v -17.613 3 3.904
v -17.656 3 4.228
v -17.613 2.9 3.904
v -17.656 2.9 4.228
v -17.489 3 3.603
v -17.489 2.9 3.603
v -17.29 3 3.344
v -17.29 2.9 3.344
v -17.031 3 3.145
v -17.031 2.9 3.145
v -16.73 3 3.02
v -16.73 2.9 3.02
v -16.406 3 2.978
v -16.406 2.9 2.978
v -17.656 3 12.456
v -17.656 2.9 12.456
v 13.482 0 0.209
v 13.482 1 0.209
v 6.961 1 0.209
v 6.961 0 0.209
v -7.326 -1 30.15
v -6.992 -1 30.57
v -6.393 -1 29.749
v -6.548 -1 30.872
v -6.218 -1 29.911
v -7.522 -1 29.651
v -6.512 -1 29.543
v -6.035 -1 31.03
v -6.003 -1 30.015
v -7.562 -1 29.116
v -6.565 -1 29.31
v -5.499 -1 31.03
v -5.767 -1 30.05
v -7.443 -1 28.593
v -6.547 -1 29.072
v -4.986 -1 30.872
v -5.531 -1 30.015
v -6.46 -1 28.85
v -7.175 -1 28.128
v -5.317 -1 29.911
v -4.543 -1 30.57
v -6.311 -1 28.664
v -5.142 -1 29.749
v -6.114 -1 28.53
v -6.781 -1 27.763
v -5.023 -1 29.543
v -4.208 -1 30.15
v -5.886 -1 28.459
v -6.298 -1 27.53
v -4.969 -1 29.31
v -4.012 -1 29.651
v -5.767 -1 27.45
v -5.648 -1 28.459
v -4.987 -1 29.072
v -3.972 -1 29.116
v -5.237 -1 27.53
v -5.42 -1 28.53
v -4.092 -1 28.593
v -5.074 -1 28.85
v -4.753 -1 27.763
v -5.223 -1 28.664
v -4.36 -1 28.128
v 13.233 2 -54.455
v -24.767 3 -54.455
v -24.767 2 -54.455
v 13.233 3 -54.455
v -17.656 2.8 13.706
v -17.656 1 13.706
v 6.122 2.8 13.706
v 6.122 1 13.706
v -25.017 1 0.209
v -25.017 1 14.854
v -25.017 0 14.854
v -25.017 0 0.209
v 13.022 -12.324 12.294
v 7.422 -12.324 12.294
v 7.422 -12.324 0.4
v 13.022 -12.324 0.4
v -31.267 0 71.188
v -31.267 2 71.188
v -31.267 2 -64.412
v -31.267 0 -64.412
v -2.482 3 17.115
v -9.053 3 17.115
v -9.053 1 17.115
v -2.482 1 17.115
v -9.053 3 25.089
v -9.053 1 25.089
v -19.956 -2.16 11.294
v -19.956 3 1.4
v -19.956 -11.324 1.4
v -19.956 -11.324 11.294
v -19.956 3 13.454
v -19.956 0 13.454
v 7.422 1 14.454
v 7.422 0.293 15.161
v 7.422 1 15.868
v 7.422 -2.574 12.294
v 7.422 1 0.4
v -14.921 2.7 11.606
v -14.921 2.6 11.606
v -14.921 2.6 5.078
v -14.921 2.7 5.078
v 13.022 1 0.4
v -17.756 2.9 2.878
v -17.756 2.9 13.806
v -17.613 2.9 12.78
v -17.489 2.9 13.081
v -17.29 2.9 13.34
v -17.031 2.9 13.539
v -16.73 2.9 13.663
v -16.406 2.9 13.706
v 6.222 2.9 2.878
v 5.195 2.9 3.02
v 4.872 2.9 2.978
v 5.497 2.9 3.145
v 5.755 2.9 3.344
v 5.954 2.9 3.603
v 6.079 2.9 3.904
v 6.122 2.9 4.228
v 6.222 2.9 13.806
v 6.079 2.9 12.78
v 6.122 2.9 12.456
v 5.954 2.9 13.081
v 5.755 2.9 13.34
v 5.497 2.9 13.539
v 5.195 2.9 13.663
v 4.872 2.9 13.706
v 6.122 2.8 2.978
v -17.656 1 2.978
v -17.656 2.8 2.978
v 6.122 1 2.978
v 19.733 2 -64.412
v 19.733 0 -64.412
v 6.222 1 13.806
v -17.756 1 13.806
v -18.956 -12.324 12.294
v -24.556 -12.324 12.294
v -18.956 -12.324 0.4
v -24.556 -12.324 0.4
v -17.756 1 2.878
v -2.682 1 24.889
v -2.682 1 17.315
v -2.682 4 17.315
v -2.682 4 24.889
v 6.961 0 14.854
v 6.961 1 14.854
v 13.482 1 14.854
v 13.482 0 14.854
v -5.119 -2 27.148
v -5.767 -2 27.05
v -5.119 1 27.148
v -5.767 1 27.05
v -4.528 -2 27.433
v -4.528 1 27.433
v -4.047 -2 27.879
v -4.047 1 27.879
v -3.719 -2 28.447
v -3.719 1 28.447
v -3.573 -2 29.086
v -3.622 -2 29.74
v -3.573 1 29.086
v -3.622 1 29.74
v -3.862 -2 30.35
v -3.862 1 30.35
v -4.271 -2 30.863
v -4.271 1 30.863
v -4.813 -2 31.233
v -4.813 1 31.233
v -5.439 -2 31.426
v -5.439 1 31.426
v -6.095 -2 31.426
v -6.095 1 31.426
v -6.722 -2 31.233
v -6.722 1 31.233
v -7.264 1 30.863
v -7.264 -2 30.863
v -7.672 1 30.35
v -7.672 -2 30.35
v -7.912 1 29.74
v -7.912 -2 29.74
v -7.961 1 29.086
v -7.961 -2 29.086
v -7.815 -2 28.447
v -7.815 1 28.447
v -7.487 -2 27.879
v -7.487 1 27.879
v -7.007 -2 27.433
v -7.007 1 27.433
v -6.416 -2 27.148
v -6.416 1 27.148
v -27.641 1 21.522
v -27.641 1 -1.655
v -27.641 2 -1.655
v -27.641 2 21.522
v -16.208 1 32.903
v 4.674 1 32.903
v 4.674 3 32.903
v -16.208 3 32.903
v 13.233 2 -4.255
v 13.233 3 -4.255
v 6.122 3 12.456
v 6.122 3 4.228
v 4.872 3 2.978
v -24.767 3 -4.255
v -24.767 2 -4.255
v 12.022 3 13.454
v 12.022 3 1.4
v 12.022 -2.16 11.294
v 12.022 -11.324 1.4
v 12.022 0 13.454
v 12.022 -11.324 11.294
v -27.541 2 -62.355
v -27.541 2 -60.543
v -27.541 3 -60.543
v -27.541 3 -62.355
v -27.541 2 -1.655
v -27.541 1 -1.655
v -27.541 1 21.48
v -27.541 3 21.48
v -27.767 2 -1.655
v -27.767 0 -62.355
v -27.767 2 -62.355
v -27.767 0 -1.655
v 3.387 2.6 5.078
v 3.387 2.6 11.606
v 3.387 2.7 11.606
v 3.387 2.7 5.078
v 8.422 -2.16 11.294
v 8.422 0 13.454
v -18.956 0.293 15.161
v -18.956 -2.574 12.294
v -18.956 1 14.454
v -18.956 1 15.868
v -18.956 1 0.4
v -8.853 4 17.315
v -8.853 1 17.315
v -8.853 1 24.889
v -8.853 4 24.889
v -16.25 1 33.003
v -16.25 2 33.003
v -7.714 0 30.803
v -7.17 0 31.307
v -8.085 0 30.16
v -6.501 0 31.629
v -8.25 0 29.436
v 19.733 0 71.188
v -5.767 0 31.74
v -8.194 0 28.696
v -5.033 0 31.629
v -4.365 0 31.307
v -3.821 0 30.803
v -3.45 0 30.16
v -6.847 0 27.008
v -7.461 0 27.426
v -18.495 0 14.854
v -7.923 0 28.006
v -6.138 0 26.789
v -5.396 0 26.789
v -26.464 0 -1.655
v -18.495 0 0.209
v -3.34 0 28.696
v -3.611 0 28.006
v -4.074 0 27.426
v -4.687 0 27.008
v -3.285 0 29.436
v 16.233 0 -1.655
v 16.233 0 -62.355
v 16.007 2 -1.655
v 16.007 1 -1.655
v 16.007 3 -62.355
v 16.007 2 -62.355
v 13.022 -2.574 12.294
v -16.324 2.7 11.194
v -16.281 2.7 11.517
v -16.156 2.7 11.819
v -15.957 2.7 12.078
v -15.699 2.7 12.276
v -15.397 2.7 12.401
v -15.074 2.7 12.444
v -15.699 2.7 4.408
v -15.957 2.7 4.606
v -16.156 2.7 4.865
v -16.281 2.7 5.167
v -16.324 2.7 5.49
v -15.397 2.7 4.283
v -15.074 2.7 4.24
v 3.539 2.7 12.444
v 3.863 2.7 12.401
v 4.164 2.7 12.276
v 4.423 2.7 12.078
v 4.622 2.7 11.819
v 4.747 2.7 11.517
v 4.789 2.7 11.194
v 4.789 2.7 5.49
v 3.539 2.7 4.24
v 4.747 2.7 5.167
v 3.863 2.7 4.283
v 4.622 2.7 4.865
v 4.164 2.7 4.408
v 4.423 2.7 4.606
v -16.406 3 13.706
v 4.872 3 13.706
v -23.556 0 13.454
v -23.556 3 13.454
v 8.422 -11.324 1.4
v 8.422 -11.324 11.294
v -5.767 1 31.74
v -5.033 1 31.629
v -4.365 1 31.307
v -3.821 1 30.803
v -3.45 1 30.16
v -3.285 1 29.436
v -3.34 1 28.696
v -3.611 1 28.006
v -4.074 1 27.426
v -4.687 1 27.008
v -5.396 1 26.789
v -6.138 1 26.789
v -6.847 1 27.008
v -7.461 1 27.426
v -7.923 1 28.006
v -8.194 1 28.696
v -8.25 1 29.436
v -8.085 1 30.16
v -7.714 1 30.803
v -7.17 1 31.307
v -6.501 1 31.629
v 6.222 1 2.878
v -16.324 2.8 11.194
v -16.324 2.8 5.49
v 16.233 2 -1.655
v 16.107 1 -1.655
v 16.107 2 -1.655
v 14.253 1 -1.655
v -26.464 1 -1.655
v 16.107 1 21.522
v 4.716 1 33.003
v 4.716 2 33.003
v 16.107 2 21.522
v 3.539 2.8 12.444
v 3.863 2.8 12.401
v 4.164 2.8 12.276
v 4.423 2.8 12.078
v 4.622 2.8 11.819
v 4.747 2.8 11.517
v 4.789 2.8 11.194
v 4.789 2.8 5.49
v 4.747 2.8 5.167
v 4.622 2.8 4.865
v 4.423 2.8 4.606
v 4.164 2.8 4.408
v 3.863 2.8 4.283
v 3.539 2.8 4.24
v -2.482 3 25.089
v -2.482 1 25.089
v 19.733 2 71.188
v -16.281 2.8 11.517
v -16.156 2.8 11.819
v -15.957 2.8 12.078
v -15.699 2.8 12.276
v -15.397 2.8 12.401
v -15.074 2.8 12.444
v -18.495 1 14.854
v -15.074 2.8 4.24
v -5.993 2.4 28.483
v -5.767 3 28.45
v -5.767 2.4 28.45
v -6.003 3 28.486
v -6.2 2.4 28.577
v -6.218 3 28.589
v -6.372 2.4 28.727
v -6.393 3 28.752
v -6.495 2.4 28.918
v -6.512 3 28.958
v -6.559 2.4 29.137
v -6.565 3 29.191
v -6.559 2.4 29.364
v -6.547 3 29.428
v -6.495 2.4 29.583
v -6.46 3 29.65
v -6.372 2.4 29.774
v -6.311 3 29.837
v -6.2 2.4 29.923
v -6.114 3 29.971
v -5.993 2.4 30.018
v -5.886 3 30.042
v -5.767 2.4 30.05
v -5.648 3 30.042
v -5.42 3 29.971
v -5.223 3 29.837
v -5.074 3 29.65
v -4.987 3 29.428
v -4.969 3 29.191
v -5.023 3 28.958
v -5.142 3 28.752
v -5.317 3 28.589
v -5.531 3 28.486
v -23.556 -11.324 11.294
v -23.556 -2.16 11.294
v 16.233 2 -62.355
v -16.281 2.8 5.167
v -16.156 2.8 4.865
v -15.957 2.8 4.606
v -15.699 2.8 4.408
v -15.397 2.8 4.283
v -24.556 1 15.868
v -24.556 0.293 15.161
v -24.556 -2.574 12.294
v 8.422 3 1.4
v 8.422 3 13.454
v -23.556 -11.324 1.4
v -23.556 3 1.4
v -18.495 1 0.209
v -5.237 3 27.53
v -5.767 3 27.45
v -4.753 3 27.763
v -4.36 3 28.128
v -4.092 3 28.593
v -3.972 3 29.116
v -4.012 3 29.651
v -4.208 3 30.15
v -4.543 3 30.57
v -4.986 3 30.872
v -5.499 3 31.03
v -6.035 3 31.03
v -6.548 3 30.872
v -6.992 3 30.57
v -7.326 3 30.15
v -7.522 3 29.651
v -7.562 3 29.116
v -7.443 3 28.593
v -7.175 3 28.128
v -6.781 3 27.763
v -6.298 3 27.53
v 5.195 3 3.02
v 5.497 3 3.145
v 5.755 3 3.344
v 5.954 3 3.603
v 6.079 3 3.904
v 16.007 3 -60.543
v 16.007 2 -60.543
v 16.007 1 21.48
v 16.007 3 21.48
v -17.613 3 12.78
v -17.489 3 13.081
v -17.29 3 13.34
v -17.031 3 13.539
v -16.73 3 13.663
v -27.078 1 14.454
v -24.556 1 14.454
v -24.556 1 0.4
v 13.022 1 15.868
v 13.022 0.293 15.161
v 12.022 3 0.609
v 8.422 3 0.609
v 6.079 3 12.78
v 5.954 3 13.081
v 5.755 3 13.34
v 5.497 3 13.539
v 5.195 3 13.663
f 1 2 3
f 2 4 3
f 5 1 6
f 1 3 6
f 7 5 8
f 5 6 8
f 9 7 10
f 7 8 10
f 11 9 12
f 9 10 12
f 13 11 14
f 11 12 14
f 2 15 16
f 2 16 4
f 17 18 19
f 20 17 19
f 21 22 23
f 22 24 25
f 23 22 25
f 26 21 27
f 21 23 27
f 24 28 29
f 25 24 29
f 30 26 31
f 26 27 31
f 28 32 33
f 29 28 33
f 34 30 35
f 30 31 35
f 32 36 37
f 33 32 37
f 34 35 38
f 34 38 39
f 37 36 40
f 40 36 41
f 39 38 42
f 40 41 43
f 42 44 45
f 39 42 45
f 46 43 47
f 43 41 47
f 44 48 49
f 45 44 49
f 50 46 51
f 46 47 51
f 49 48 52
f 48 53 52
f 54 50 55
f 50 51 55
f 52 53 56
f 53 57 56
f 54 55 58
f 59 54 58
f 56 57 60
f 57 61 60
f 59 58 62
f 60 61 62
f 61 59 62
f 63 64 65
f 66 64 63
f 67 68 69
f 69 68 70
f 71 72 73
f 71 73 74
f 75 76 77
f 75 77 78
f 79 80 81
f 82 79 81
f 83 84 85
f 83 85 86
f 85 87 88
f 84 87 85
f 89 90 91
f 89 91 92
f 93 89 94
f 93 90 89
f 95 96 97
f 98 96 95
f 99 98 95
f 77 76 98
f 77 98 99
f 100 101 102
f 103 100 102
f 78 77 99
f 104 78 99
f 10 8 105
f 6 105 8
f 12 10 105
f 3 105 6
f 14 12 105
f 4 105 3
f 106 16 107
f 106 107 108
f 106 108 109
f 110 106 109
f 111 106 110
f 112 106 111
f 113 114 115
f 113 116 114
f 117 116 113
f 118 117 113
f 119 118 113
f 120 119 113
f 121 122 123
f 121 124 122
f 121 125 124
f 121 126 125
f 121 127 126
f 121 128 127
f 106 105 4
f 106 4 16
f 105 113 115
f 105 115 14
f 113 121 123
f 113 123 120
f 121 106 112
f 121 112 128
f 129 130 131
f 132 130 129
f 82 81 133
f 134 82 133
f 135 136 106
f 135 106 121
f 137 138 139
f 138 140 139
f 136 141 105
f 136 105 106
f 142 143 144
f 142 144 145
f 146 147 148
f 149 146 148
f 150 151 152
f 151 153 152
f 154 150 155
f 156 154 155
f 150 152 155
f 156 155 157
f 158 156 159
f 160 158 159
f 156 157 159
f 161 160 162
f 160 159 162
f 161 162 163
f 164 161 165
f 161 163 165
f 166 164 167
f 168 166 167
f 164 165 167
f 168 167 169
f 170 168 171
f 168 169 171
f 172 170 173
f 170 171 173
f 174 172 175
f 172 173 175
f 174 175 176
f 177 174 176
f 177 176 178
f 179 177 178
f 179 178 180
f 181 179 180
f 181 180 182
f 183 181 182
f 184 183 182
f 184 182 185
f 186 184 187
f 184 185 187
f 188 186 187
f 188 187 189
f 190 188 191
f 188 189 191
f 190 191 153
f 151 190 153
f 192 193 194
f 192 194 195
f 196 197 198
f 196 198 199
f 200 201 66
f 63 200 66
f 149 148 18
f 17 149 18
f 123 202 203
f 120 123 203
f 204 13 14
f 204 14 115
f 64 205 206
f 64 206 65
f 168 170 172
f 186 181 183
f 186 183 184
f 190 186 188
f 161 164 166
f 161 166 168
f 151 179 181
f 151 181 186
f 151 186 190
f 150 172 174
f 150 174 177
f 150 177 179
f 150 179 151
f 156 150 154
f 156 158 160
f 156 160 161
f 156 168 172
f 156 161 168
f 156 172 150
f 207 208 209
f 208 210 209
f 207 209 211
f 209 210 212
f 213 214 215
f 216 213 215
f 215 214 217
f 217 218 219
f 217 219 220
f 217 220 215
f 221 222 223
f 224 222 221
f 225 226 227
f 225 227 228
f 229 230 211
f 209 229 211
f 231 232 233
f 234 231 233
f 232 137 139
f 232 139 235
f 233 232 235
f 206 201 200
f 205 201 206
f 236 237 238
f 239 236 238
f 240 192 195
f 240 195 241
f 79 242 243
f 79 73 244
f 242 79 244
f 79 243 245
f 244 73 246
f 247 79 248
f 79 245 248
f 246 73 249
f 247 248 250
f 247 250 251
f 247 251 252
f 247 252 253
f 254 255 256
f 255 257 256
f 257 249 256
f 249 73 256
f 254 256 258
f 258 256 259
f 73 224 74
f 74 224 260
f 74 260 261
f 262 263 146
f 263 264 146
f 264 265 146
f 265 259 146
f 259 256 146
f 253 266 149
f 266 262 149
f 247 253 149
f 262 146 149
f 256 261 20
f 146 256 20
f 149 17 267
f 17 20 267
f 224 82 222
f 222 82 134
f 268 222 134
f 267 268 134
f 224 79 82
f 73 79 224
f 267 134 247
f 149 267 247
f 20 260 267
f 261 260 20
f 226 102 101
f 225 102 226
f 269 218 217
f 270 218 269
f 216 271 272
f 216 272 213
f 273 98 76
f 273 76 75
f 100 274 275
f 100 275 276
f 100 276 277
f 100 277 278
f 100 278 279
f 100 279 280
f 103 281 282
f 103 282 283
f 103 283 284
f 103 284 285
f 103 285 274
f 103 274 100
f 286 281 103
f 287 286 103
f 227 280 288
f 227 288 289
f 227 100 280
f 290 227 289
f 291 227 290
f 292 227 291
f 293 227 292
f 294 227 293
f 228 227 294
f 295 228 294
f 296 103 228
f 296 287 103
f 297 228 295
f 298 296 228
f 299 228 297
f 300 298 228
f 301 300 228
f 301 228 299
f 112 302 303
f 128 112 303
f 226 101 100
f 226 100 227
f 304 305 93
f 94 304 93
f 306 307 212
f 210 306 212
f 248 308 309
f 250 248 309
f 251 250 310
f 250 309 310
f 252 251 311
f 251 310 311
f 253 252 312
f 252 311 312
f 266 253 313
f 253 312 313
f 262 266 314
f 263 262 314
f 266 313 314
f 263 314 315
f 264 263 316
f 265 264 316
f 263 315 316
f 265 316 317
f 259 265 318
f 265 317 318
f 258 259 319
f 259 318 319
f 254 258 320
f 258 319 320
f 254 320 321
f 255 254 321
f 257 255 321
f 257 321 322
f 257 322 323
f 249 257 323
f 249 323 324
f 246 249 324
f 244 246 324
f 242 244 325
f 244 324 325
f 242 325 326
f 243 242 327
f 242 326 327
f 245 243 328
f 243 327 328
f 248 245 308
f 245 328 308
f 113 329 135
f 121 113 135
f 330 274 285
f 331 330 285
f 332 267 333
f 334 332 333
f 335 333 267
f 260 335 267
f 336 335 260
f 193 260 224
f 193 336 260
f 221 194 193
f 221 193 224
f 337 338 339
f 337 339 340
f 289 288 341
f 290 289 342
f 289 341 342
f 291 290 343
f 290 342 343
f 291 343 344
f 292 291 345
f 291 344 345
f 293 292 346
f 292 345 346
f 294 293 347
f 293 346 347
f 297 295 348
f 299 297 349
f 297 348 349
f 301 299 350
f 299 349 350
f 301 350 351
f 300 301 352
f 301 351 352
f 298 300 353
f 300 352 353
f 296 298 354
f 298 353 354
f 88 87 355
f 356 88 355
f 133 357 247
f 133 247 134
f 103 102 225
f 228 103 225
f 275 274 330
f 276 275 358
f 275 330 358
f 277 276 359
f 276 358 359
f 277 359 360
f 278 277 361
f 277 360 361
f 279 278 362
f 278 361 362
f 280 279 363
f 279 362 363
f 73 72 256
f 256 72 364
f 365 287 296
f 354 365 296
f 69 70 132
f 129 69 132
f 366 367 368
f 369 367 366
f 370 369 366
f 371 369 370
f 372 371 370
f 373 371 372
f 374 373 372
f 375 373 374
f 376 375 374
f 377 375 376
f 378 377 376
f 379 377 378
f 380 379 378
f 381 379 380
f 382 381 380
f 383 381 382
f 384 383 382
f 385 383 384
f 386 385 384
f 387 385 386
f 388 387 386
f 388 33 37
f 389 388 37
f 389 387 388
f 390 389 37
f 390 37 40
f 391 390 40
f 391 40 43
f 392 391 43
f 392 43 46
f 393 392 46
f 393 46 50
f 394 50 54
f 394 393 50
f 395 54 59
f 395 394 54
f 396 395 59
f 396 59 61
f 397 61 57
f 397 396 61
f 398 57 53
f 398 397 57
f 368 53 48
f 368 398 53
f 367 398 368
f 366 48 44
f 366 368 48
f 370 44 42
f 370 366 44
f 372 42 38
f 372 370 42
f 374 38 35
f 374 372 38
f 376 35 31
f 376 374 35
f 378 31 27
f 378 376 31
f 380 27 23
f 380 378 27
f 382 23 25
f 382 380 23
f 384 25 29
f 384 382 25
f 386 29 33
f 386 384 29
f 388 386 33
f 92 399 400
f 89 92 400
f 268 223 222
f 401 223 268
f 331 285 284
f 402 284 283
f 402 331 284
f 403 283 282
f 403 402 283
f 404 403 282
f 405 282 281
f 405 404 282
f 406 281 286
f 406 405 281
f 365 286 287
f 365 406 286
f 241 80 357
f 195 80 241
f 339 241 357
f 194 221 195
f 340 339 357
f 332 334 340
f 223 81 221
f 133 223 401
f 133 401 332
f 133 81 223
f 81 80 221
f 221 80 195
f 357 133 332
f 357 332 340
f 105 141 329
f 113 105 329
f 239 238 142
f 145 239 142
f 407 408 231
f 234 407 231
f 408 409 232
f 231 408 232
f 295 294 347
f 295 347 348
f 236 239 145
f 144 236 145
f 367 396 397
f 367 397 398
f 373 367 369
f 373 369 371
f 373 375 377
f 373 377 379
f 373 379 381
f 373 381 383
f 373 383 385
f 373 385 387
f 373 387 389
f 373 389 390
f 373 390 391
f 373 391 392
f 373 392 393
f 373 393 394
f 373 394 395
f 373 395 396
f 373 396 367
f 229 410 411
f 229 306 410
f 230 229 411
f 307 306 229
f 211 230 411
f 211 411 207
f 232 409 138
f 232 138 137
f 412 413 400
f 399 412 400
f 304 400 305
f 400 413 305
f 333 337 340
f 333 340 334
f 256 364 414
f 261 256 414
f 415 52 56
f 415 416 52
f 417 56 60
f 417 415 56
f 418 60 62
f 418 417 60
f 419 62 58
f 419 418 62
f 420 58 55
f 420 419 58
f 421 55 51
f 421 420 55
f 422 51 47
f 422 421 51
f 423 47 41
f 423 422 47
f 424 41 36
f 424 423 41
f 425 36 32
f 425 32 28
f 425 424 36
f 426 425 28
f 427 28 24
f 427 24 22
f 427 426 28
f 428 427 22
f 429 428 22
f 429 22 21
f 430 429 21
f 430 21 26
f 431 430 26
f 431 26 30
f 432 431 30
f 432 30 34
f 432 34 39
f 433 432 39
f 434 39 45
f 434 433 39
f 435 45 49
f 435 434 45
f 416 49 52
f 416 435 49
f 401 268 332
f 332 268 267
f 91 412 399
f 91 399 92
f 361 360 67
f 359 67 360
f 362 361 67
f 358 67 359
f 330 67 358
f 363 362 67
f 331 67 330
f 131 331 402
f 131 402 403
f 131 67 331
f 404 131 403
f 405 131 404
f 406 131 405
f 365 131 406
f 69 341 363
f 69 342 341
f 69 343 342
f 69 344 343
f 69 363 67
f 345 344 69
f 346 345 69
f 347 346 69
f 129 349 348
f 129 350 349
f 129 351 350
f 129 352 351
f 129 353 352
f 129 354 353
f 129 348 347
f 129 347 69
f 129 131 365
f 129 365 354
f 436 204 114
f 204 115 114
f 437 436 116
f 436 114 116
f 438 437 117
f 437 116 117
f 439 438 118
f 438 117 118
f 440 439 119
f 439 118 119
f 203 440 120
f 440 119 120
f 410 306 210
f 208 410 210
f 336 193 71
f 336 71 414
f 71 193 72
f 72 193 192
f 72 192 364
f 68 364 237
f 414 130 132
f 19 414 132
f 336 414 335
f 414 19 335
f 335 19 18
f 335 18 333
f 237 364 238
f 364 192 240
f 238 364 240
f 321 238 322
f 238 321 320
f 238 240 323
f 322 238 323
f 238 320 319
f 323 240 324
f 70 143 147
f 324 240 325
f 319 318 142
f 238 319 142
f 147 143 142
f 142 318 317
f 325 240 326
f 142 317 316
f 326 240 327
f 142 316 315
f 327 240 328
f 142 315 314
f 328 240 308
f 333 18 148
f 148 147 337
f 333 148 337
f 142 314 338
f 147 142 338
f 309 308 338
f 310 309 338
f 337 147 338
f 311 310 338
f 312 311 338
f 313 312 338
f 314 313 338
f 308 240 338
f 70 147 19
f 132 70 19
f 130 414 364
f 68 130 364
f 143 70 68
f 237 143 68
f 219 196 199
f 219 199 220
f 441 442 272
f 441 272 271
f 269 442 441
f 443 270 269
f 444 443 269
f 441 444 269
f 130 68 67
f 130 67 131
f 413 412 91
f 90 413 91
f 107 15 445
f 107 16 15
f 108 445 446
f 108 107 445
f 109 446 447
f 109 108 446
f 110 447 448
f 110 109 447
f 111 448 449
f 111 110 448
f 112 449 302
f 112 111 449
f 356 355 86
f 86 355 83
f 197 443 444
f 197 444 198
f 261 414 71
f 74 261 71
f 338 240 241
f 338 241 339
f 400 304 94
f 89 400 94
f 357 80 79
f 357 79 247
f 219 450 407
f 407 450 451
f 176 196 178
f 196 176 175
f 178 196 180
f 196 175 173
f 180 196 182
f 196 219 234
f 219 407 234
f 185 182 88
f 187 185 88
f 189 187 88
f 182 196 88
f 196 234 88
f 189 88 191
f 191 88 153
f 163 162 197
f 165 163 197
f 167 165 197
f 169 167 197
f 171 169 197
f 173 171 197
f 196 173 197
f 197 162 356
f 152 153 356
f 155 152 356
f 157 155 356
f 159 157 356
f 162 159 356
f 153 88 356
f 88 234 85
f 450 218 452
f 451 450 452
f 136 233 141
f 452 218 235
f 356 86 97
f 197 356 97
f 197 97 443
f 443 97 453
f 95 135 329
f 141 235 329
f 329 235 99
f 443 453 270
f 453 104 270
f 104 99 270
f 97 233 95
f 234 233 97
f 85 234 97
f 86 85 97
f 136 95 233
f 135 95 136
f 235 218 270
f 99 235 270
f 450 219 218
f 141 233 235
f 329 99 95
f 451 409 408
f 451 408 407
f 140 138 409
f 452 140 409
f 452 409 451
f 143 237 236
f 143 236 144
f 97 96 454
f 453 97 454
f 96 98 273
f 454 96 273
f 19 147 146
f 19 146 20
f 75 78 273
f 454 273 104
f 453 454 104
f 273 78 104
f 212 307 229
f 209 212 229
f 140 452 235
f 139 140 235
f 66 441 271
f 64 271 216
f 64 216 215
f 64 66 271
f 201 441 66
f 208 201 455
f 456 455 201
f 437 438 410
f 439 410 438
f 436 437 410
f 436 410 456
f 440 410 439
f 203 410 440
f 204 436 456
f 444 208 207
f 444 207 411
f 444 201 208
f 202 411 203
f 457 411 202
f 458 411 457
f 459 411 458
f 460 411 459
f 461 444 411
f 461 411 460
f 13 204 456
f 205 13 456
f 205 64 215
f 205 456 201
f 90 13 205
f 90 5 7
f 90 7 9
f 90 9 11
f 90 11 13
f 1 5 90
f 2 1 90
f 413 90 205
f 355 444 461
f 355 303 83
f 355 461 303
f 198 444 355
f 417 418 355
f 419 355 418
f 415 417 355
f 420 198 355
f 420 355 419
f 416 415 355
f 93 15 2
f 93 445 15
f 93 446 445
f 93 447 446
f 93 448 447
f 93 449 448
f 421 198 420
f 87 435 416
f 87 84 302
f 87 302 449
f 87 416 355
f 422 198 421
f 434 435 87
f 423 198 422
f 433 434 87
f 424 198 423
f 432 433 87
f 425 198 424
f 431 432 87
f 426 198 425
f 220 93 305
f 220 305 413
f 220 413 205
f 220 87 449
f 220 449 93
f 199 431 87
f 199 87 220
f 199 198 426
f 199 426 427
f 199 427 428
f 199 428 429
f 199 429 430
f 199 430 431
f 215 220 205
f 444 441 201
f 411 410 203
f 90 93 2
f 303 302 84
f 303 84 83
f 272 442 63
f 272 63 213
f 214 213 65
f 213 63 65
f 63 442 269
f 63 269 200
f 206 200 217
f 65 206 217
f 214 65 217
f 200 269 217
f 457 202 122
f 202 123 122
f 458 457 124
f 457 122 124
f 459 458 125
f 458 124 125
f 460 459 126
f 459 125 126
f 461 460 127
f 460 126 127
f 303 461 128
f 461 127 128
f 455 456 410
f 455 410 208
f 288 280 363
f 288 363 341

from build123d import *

# Parameters (mm, degrees)
SKETCH1_W                   = 51.332398317
SKETCH1_H                   = 136.325385694
BOSS_EXTRUDE1_DEPTH         = 2
CUT_EXTRUDE1_DEPTH          = 1
SKETCH3_W                   = 26.718092566
SKETCH3_H                   = 51.160838605
CUT_EXTRUDE2_DEPTH          = 1
SKETCH4_W                   = 20.659186536
SKETCH4_H                   = 13.604488078
BOSS_EXTRUDE2_DEPTH         = 1
SKETCH5_W                   = 6.521739131
SKETCH5_H                   = 14.853538096
SKETCH5_W_2                 = 6.52173913
SKETCH5_H_2                 = 15.644764374
CUT_EXTRUDE3_DEPTH          = 1
SKETCH6_W                   = 6.171107994
SKETCH6_H                   = 7.573632539
CUT_EXTRUDE4_DEPTH          = 1
SKETCH7_R                   = 2.489481066
CUT_EXTRUDE5_DEPTH          = 1
BOSS_EXTRUDE3_DEPTH         = 1
SKETCH10_W                  = 6.171107994
SKETCH10_H                  = 7.573632539
BOSS_EXTRUDE4_DEPTH         = 4
BOSS_EXTRUDE5_DEPTH         = 2
SKETCH12_W                  = 6.571107994
SKETCH12_H                  = 7.973632539
CUT_EXTRUDE6_DEPTH          = 2
SKETCH13_R                  = 1.8
SKETCH13_W                  = 26.718092566
SKETCH13_H                  = 51.160838605
CUT_EXTRUDE9_DEPTH          = 2
SKETCH14_R                  = 2.2
SKETCH14_R_2                = 1.8
BOSS_EXTRUDE11_DEPTH        = 2
SKETCH17_R                  = 2.2
BOSS_EXTRUDE12_DEPTH        = 1
SKETCH18_R                  = 0.8
BOSS_EXTRUDE15_DEPTH        = 3.4
EXTRUDE_THIN3_OUTLINE_W     = 5.6
EXTRUDE_THIN3_OUTLINE_H     = 14.844764374
EXTRUDE_THIN3_OUTLINE_W_2   = 3.6
EXTRUDE_THIN3_OUTLINE_H_2   = 12.844764374
EXTRUDE_THIN3_DEPTH         = 13.32398317
EXTRUDE_THIN3_2_OUTLINE_W   = 5.6
EXTRUDE_THIN3_2_OUTLINE_H   = 14.053538096
EXTRUDE_THIN3_2_OUTLINE_W_2 = 3.6
EXTRUDE_THIN3_2_OUTLINE_H_2 = 12.053538096
EXTRUDE_THIN3_2_DEPTH       = 13.32398317
SKETCH26_W                  = 3.6
SKETCH26_H                  = 12.053538096
SKETCH26_H_2                = 12.844764374
CUT_EXTRUDE12_DEPTH         = 13.32398317
SKETCH27_W                  = 5.6
SKETCH27_H                  = 14.053538096
BOSS_EXTRUDE18_DEPTH        = 1
SKETCH27_W_2                = 5.570395019
SKETCH27_H_2                = 14.844764374
BOSS_EXTRUDE18_2_DEPTH      = 1
SKETCH28_W                  = 20.659186536
SKETCH28_H                  = 13.604488078
CUT_EXTRUDE13_DEPTH         = 1
SKETCH29_W                  = 23.777559608
SKETCH29_H                  = 10.728152402
CUT_EXTRUDE15_DEPTH         = 10
SKETCH30_W                  = 23.777559608
SKETCH30_H                  = 10.728152402
SKETCH30_W_2                = 21.112762974
SKETCH30_H_2                = 8.203608222
BOSS_EXTRUDE20_DEPTH        = 1.8
SKETCH31_W                  = 21.112762974
SKETCH31_H                  = 8.203608222
BOSS_EXTRUDE21_DEPTH        = 1.6
SKETCH35_W                  = 23.977559608
SKETCH35_H                  = 10.928152402
CUT_EXTRUDE21_DEPTH         = 1.9
FILLET2_R                   = 1.25
FILLET3_R                   = 1.25
SKETCH37_W                  = 18.307713885
SKETCH37_H                  = 6.527591392
CUT_EXTRUDE22_DEPTH         = 0.1
SKETCH41_W                  = 18.307713885
SKETCH41_H                  = 6.527591392
BOSS_EXTRUDE27_DEPTH        = 0.1
SKETCH43_W                  = 18.307713885
SKETCH43_H                  = 6.527591392
BOSS_EXTRUDE28_DEPTH        = 0.1
CUT_EXTRUDE24_DEPTH         = 40.1
SKETCH51_W                  = 5.6
SKETCH51_H                  = 4.468914857
BOSS_EXTRUDE29_DEPTH        = 1
BOSS_EXTRUDE29_2_DEPTH      = 1
SKETCH52_W                  = 5.6
SKETCH52_H                  = 1
BOSS_EXTRUDE30_DEPTH        = 2.5
BOSS_EXTRUDE30_2_DEPTH      = 2.5
SKETCH53_W                  = 5.6
SKETCH53_H                  = 1
BOSS_EXTRUDE31_DEPTH        = 1
BOSS_EXTRUDE32_START        = 7.421556697
BOSS_EXTRUDE32_DEPTH        = 5.6
BOSS_EXTRUDE32_START_2      = -24.556002911
BOSS_EXTRUDE32_2_DEPTH      = 5.6
SKETCH55_W                  = 3.6
SKETCH55_H                  = 0.791226278
BOSS_EXTRUDE33_DEPTH        = 14.323983
SKETCH56_W                  = 0.791226278
SKETCH56_H                  = 13.32398317
CUT_EXTRUDE25_DEPTH         = 5.6
CUT_EXTRUDE_THIN1_DEPTH     = 1
SKETCH59_W                  = 71.33
SKETCH59_H                  = 156.33
SKETCH59_W_2                = 51.33
SKETCH59_H_2                = 136.33
CUT_EXTRUDE_THIN2_DEPTH     = 10
SKETCH60_W                  = 71
SKETCH60_H                  = 156
SKETCH60_W_2                = 51
SKETCH60_H_2                = 136
CUT_EXTRUDE_THIN3_DEPTH     = 10
SKETCH61_W                  = 51
SKETCH61_H                  = 2
CUT_EXTRUDE26_DEPTH         = 0.4
SKETCH62_W                  = 38
SKETCH62_H                  = 51.160838605
CUT_EXTRUDE28_DEPTH         = 10
SKETCH64_W                  = 38
SKETCH64_H                  = 0.08
BOSS_EXTRUDE35_DEPTH        = 2
SKETCH65_W                  = 38
SKETCH65_H                  = 0.08
BOSS_EXTRUDE37_DEPTH        = 1
SKETCH67_W                  = 44
SKETCH67_H                  = 61.400838605
CUT_EXTRUDE31_DEPTH         = 2
SKETCH69_W                  = 40.716981818
SKETCH69_H                  = 1
BOSS_EXTRUDE39_DEPTH        = 1.863286117
SKETCH70_W                  = 44
SKETCH70_H                  = 2
BOSS_EXTRUDE40_DEPTH        = 1
SKETCH71_W                  = 38
SKETCH71_H                  = 1
CUT_EXTRUDE32_DEPTH         = 1
SKETCH72_W                  = 38
SKETCH72_H                  = 1
BOSS_EXTRUDE41_DEPTH        = 1.8
SKETCH73_W                  = 44
SKETCH73_H                  = 2
CUT_EXTRUDE33_DEPTH         = 0.3
SKETCH74_W                  = 43.548387097
SKETCH74_H                  = 1
BOSS_EXTRUDE43_DEPTH        = 1.812426367
SKETCH75_R                  = 0.8
BOSS_EXTRUDE44_DEPTH        = 0.6


with BuildPart() as part:
    # Sketch1 → Boss-Extrude1 (new body)
    with BuildSketch(Plane(origin=(0, 0, 0), x_dir=(1, 0, 0), z_dir=(0, 1, 0))):
        with Locations((-5.767223106, -3.58751015)):
            Rectangle(SKETCH1_W, SKETCH1_H)
    extrude(amount=BOSS_EXTRUDE1_DEPTH)

    # Sketch2 → Cut-Extrude1 (cut)
    with BuildSketch(Plane(origin=(0, 2, 0), x_dir=(1, 0, 0), z_dir=(0, 1, 0))):
        Polygon((-27.541416655, -30.445855171), (-27.541416655, 60.542924633), (16.006970442, 60.542924633), (16.006970442, -30.445855171), (4.678976052, -41.666051524), (-16.213422265, -41.666051524), align=None)
    extrude(amount=-CUT_EXTRUDE1_DEPTH, mode=Mode.SUBTRACT)

    # Sketch3 → Cut-Extrude2 (cut)
    with BuildSketch(Plane(origin=(0, 1, 0), x_dir=(1, 0, 0), z_dir=(0, 1, 0))):
        with Locations((-5.767223107, 30.754931698)):
            Rectangle(SKETCH3_W, SKETCH3_H)
    extrude(amount=-CUT_EXTRUDE2_DEPTH, mode=Mode.SUBTRACT)

    # Sketch4 → Boss-Extrude2 (add)
    with BuildSketch(Plane(origin=(0, 1, 0), x_dir=(1, 0, 0), z_dir=(0, 1, 0))):
        with Locations((-5.767223107, -7.988180452)):
            Rectangle(SKETCH4_W, SKETCH4_H)
    extrude(amount=BOSS_EXTRUDE2_DEPTH)

    # Sketch5 → Cut-Extrude3 (cut)
    with BuildSketch(Plane(origin=(0, 1, 0), x_dir=(1, 0, 0), z_dir=(0, 1, 0))):
        with Locations((-21.756002911, -7.426769048)):
            Rectangle(SKETCH5_W, SKETCH5_H)
        with Locations((10.221556697, -7.031155909)):
            Rectangle(SKETCH5_W_2, SKETCH5_H_2)
    extrude(amount=-CUT_EXTRUDE3_DEPTH, mode=Mode.SUBTRACT)

    # Sketch6 → Cut-Extrude4 (cut)
    with BuildSketch(Plane(origin=(0, 1, 0), x_dir=(1, 0, 0), z_dir=(0, 1, 0))):
        with Locations((-5.767223107, -21.101784941)):
            Rectangle(SKETCH6_W, SKETCH6_H)
    extrude(amount=-CUT_EXTRUDE4_DEPTH, mode=Mode.SUBTRACT)

    # Sketch7 → Cut-Extrude5 (cut)
    with BuildSketch(Plane(origin=(0, 1, 0), x_dir=(1, 0, 0), z_dir=(0, 1, 0))):
        with Locations(Location((-5.767223107, -29.250452542, 0), (0, 0, 270))):
            Circle(SKETCH7_R)
    extrude(amount=-CUT_EXTRUDE5_DEPTH, mode=Mode.SUBTRACT)

    # Sketch8 → Boss-Extrude3 (add)
    with BuildSketch(Plane(origin=(0, 1, 0), x_dir=(1, 0, 0), z_dir=(0, 1, 0))):
        Polygon((-27.541416655, -21.480466567), (-27.541416655, -30.445855171), (-16.213422265, -41.666051524), (4.678976052, -41.666051524), (16.006970442, -30.445855171), (16.006970442, -21.480466567), (4.673870862, -32.903327717), (-16.208317076, -32.903327717), align=None)
    extrude(amount=BOSS_EXTRUDE3_DEPTH)

    # Sketch10 → Boss-Extrude4 (add)
    with BuildSketch(Plane.XZ):
        with Locations((-5.767223107, 21.101784941)):
            Rectangle(SKETCH10_W, SKETCH10_H)
    extrude(amount=-BOSS_EXTRUDE4_DEPTH)

    # Sketch28 → Cut-Extrude13 (cut)
    with BuildSketch(Plane(origin=(0, 2, 0), x_dir=(1, 0, 0), z_dir=(0, 1, 0))):
        with Locations((-5.767223107, -7.988180452)):
            Rectangle(SKETCH28_W, SKETCH28_H)
    extrude(amount=-CUT_EXTRUDE13_DEPTH, mode=Mode.SUBTRACT)


with BuildPart() as body_2:
    # Sketch11 → Boss-Extrude5 (new body)
    with BuildSketch(Plane(origin=(0, 1, 0), x_dir=(1, 0, 0), z_dir=(0, 1, 0))):
        Polygon((-27.541416655, 60.542924633), (16.006970442, 60.542924633), (16.006970442, -21.480466567), (4.673870862, -32.903327717), (-16.208317076, -32.903327717), (-27.541416655, -21.480466567), align=None)
    extrude(amount=BOSS_EXTRUDE5_DEPTH)

    # Sketch12 → Cut-Extrude6 (cut)
    with BuildSketch(Plane(origin=(0, 3, 0), x_dir=(1, 0, 0), z_dir=(0, 1, 0))):
        with Locations((-5.767223107, -21.10178494)):
            Rectangle(SKETCH12_W, SKETCH12_H)
    extrude(amount=-CUT_EXTRUDE6_DEPTH, mode=Mode.SUBTRACT)

    # Sketch13 → Cut-Extrude9 (cut)
    with BuildSketch(Plane.XZ.offset(-1)):
        with Locations(Location((-5.767223107, 29.250452542, 0), (0, 0, 270))):
            Circle(SKETCH13_R)
        with Locations((-5.767223107, -30.754931698)):
            Rectangle(SKETCH13_W, SKETCH13_H)
    extrude(amount=-CUT_EXTRUDE9_DEPTH, mode=Mode.SUBTRACT)


with BuildPart() as body_3:
    # Sketch14 → Boss-Extrude11 (new body)
    with BuildSketch(Plane.XZ.offset(-1)):
        with Locations(Location((-5.767223107, 29.250452542, 0), (0, 0, 270))):
            Circle(SKETCH14_R)
        with Locations(Location((-5.767223107, 29.250452542, 0), (0, 0, 270))):
            Circle(SKETCH14_R_2, mode=Mode.SUBTRACT)
    extrude(amount=BOSS_EXTRUDE11_DEPTH)

    # Combine1: union body 2
    add(body_2.part)

    # Sketch17 → Boss-Extrude12 (add)
    with BuildSketch(Plane.XZ.offset(1)):
        with Locations(Location((-5.767223107, 29.250452542, 0), (0, 0, 270))):
            Circle(SKETCH17_R)
    extrude(amount=BOSS_EXTRUDE12_DEPTH)


with BuildPart() as body_3_2:
    # Sketch18 → Boss-Extrude15 (new body)
    with BuildSketch(Plane(origin=(0, -1, 0), x_dir=(1, 0, 0), z_dir=(0, 1, 0))):
        with Locations(Location((-5.767223107, -29.250452542, 0), (0, 0, 270))):
            Circle(SKETCH18_R)
    extrude(amount=BOSS_EXTRUDE15_DEPTH)


with BuildPart() as body_3_1:
    add(body_3.part)

    # Combine3: union body 3 2
    add(body_3_2.part)

    # Sketch26 → Cut-Extrude12 (cut)
    with BuildSketch(Plane.XZ.offset(-1)):
        with Locations((-21.756002911, 7.426769048)):
            Rectangle(SKETCH26_W, SKETCH26_H)
        with Locations((10.221556697, 7.031155909)):
            Rectangle(SKETCH26_W, SKETCH26_H_2)
    extrude(amount=-CUT_EXTRUDE12_DEPTH, mode=Mode.SUBTRACT)


with BuildPart() as body_3_3:
    # Extrude-Thin3: read off the stored shape, not the designer's step
    # Extrude-Thin3 outline → Extrude-Thin3 (new body)
    with BuildSketch(Plane.XZ.offset(-1)):
        with Locations((10.221556697, 7.031155909)):
            Rectangle(EXTRUDE_THIN3_OUTLINE_W, EXTRUDE_THIN3_OUTLINE_H)
        with Locations((10.221556697, 7.031155909)):
            Rectangle(EXTRUDE_THIN3_OUTLINE_W_2, EXTRUDE_THIN3_OUTLINE_H_2, mode=Mode.SUBTRACT)
    extrude(amount=EXTRUDE_THIN3_DEPTH)


with BuildPart() as body_4:
    # Extrude-Thin3 2 outline → Extrude-Thin3 2 (new body)
    with BuildSketch(Plane.XZ.offset(-1)):
        with Locations((-21.756002911, 7.426769048)):
            Rectangle(EXTRUDE_THIN3_2_OUTLINE_W, EXTRUDE_THIN3_2_OUTLINE_H)
        with Locations((-21.756002911, 7.426769048)):
            Rectangle(EXTRUDE_THIN3_2_OUTLINE_W_2, EXTRUDE_THIN3_2_OUTLINE_H_2, mode=Mode.SUBTRACT)
    extrude(amount=EXTRUDE_THIN3_2_DEPTH)


with BuildPart() as body_5:
    # Sketch27 → Boss-Extrude18 (new body)
    with BuildSketch(Plane.XZ.offset(12.32398317)):
        with Locations((-21.756002911, 7.426769048)):
            Rectangle(SKETCH27_W, SKETCH27_H)
    extrude(amount=-BOSS_EXTRUDE18_DEPTH)


with BuildPart() as body_6:
    # Sketch27 → Boss-Extrude18 2 (new body)
    with BuildSketch(Plane.XZ.offset(12.32398317)):
        with Locations((10.206754207, 7.031155909)):
            Rectangle(SKETCH27_W_2, SKETCH27_H_2)
    extrude(amount=-BOSS_EXTRUDE18_2_DEPTH)


with BuildPart() as body_4_1:
    add(body_4.part)

    # Combine4: union body 3 3, body 3, body 5, body 6
    add(body_3_3.part)
    add(body_3_1.part)
    add(body_5.part)
    add(body_6.part)

    # Sketch29 → Cut-Extrude15 (cut)
    with BuildSketch(Plane(origin=(0, 3, 0), x_dir=(1, 0, 0), z_dir=(0, 1, 0))):
        with Locations((-5.767223107, -8.341916313)):
            Rectangle(SKETCH29_W, SKETCH29_H)
    extrude(amount=-CUT_EXTRUDE15_DEPTH, mode=Mode.SUBTRACT)

    # Sketch35 → Cut-Extrude21 (cut)
    with BuildSketch(Plane.XZ.offset(-1)):
        with Locations((-5.767223107, 8.341916313)):
            Rectangle(SKETCH35_W, SKETCH35_H)
    extrude(amount=-CUT_EXTRUDE21_DEPTH, mode=Mode.SUBTRACT)

    # Fillet2
    fillet2_edges = [body_4_1.edges().sort_by_distance(p)[0] for p in [
        (-17.656002911, 2.95, 13.705992514),
        (6.121556697, 2.95, 13.705992514),
        (6.121556697, 2.95, 2.977840112),
        (-17.656002911, 2.95, 2.977840112),
    ]]
    fillet(fillet2_edges, radius=FILLET2_R)

    # Sketch50 → Cut-Extrude24 (cut)
    with BuildSketch(Plane(origin=(13.021556697, 0, 0), x_dir=(0, 0, -1), z_dir=(1, 0, 0))):
        Polygon((-14.453538096, 1), (-11.293538096, -2.16), (-11.293538096, -12.32398317), (-14.453538096, -12.32398317), align=None)
    extrude(amount=-CUT_EXTRUDE24_DEPTH, mode=Mode.SUBTRACT)


with BuildPart() as body_3_4:
    # Sketch30 → Boss-Extrude20 (new body)
    with BuildSketch(Plane(origin=(0, 1, 0), x_dir=(1, 0, 0), z_dir=(0, 1, 0))):
        with Locations((-5.767223107, -8.341916313)):
            Rectangle(SKETCH30_W, SKETCH30_H)
        with Locations((-5.767223107, -8.341916313)):
            Rectangle(SKETCH30_W_2, SKETCH30_H_2, mode=Mode.SUBTRACT)
    extrude(amount=BOSS_EXTRUDE20_DEPTH)


with BuildPart() as body_4_2:
    # Sketch31 → Boss-Extrude21 (new body)
    with BuildSketch(Plane(origin=(0, 1, 0), x_dir=(1, 0, 0), z_dir=(0, 1, 0))):
        with Locations((-5.767223107, -8.341916313)):
            Rectangle(SKETCH31_W, SKETCH31_H)
    extrude(amount=BOSS_EXTRUDE21_DEPTH)


with BuildPart() as part_1:
    add(part.part)

    # Combine5: union body 3 4, body 4 2
    add(body_3_4.part)
    add(body_4_2.part)

    # Fillet3
    fillet3_edges = [part_1.edges().sort_by_distance(p)[0] for p in [
        (-16.323604594, 2.7, 12.443720424),
        (4.78915838, 2.7, 12.443720424),
        (4.78915838, 2.7, 4.240112202),
        (-16.323604594, 2.7, 4.240112202),
    ]]
    fillet(fillet3_edges, radius=FILLET3_R)

    # Sketch37 → Cut-Extrude22 (cut)
    with BuildSketch(Plane(origin=(0, 2.6, 0), x_dir=(1, 0, 0), z_dir=(0, 1, 0))):
        with Locations((-5.767223107, -8.341916313)):
            Rectangle(SKETCH37_W, SKETCH37_H)
    extrude(amount=-CUT_EXTRUDE22_DEPTH, mode=Mode.SUBTRACT)


with BuildPart() as body_3_5:
    # Sketch41 → Boss-Extrude27 (new body)
    with BuildSketch(Plane(origin=(0, 2.6, 0), x_dir=(1, 0, 0), z_dir=(0, 1, 0))):
        with BuildLine():
            Line((-15.073604594, -12.443720424), (3.53915838, -12.443720424))
            ThreePointArc((3.53915838, -12.443720424), (4.423041856, -12.077603901), (4.78915838, -11.193720424))
            Line((4.78915838, -11.193720424), (4.78915838, -5.490112202))
            ThreePointArc((4.78915838, -5.490112202), (4.423041856, -4.606228725), (3.53915838, -4.240112202))
            Line((3.53915838, -4.240112202), (-15.073604594, -4.240112202))
            ThreePointArc((-15.073604594, -4.240112202), (-15.95748807, -4.606228725), (-16.323604594, -5.490112202))
            Line((-16.323604594, -5.490112202), (-16.323604594, -11.193720424))
            ThreePointArc((-16.323604594, -11.193720424), (-15.95748807, -12.077603901), (-15.073604594, -12.443720424))
        make_face()
        with Locations((-5.767223107, -8.341916313)):
            Rectangle(SKETCH41_W, SKETCH41_H, mode=Mode.SUBTRACT)
    extrude(amount=BOSS_EXTRUDE27_DEPTH)

    # Combine6: union part
    add(part_1.part)


with BuildPart() as body_3_6:
    # Sketch43 → Boss-Extrude28 (new body)
    with BuildSketch(Plane(origin=(0, 2.5, 0), x_dir=(1, 0, 0), z_dir=(0, 1, 0))):
        with Locations((-5.767223107, -8.341916313)):
            Rectangle(SKETCH43_W, SKETCH43_H)
    extrude(amount=BOSS_EXTRUDE28_DEPTH)

    # Combine7: union body 3 5
    add(body_3_5.part)

    # Sketch58 → Cut-Extrude-Thin1 (cut)
    with BuildSketch(Plane(origin=(0, 1, 0), x_dir=(1, 0, 0), z_dir=(0, 1, 0))):
        Polygon((-16.249969686, -33.003327717), (4.715523472, -33.003327717), (16.106970442, -21.521657048), (16.106970442, 60.642924633), (-27.641416655, 60.642924633), (-27.641416655, -21.521657048), align=None)
        Polygon((-16.208317076, -32.903327717), (4.673870862, -32.903327717), (16.006970442, -21.480466567), (16.006970442, 60.542924633), (-27.541416655, 60.542924633), (-27.541416655, -21.480466567), align=None, mode=Mode.SUBTRACT)
    extrude(amount=CUT_EXTRUDE_THIN1_DEPTH, mode=Mode.SUBTRACT)

    # Sketch59 → Cut-Extrude-Thin2 (cut)
    with BuildSketch(Plane(origin=(0, 2, 0), x_dir=(1, 0, 0), z_dir=(0, 1, 0))):
        with Locations((-5.767223107, -3.58751015)):
            Rectangle(SKETCH59_W, SKETCH59_H)
        with Locations((-5.767223107, -3.58751015)):
            Rectangle(SKETCH59_W_2, SKETCH59_H_2, mode=Mode.SUBTRACT)
    extrude(amount=-CUT_EXTRUDE_THIN2_DEPTH, mode=Mode.SUBTRACT)

    # Sketch60 → Cut-Extrude-Thin3 (cut)
    with BuildSketch(Plane(origin=(0, 2, 0), x_dir=(1, 0, 0), z_dir=(0, 1, 0))):
        with Locations((-5.767223107, -3.58751015)):
            Rectangle(SKETCH60_W, SKETCH60_H)
        with Locations((-5.767223107, -3.58751015)):
            Rectangle(SKETCH60_W_2, SKETCH60_H_2, mode=Mode.SUBTRACT)
    extrude(amount=-CUT_EXTRUDE_THIN3_DEPTH, mode=Mode.SUBTRACT)

    # Sketch61 → Cut-Extrude26 (cut)
    with BuildSketch(Plane.XY.offset(71.58751015)):
        with Locations((-5.767223107, 1)):
            Rectangle(SKETCH61_W, SKETCH61_H)
    extrude(amount=-CUT_EXTRUDE26_DEPTH, mode=Mode.SUBTRACT)


with BuildPart() as body_3_7:
    # Sketch51 → Boss-Extrude29 (new body)
    with BuildSketch(Plane(origin=(0, -6.726769048, 6.726769048), x_dir=(1, 0, 0), z_dir=(0, -0.7071067811865475, 0.7071067811865476))):
        with Locations((10.221556697, 8.692844153)):
            Rectangle(SKETCH51_W, SKETCH51_H)
    extrude(amount=BOSS_EXTRUDE29_DEPTH)


with BuildPart() as body_4_3:
    # Sketch51 → Boss-Extrude29 2 (new body)
    with BuildSketch(Plane(origin=(0, -6.726769048, 6.726769048), x_dir=(1, 0, 0), z_dir=(0, -0.7071067811865475, 0.7071067811865476))):
        with Locations((-21.756002911, 8.692844153)):
            Rectangle(SKETCH51_W, SKETCH51_H)
    extrude(amount=BOSS_EXTRUDE29_2_DEPTH)


with BuildPart() as body_5_2:
    # Sketch52 → Boss-Extrude30 (new body)
    with BuildSketch(Plane(origin=(0, 7.726769048, 7.726769048), x_dir=(1, 0, 0), z_dir=(0, 0.7071067811865476, 0.7071067811865475))):
        with Locations((10.221556697, -10.013088019)):
            Rectangle(SKETCH52_W, SKETCH52_H)
    extrude(amount=BOSS_EXTRUDE30_DEPTH)


with BuildPart() as body_6_2:
    # Sketch52 → Boss-Extrude30 2 (new body)
    with BuildSketch(Plane(origin=(0, 7.726769048, 7.726769048), x_dir=(1, 0, 0), z_dir=(0, 0.7071067811865476, 0.7071067811865475))):
        with Locations((-21.756002911, -10.013088019)):
            Rectangle(SKETCH52_W, SKETCH52_H)
    extrude(amount=BOSS_EXTRUDE30_2_DEPTH)


with BuildPart() as body_4_4:
    add(body_4_1.part)

    # Combine8: union body 3 7, body 4 3, body 5 2, body 6 2
    add(body_3_7.part)
    add(body_4_3.part)
    add(body_5_2.part)
    add(body_6_2.part)

    # Sketch53 → Boss-Extrude31 (add)
    with BuildSketch(Plane.XY.offset(11.293538096)):
        with Locations((-21.756002911, -11.82398317)):
            Rectangle(SKETCH53_W, SKETCH53_H)
        with Locations((10.221556697, -11.82398317)):
            Rectangle(SKETCH53_W, SKETCH53_H)
    extrude(amount=BOSS_EXTRUDE31_DEPTH)


with BuildPart() as body_3_8:
    # Boss-Extrude32: read off the stored shape, not the designer's step
    # Boss-Extrude32 outline → Boss-Extrude32 (new body)
    with BuildSketch(Plane.YZ.offset(BOSS_EXTRUDE32_START)):
        Polygon((-11.32398317, 11.293538096), (-2.16, 11.293538096), (-2.867106781, 12.000644877), (-2.574213562, 12.293538096), (-11.32398317, 12.293538096), align=None)
    extrude(amount=BOSS_EXTRUDE32_DEPTH)


with BuildPart() as body_4_4_1:
    # Boss-Extrude32 2 outline → Boss-Extrude32 2 (new body)
    with BuildSketch(Plane.YZ.offset(BOSS_EXTRUDE32_START_2)):
        Polygon((-11.32398317, 11.293538096), (-2.16, 11.293538096), (-2.867106781, 12.000644877), (-2.574213562, 12.293538096), (-11.32398317, 12.293538096), align=None)
    extrude(amount=BOSS_EXTRUDE32_2_DEPTH)


with BuildPart() as body_4_5:
    add(body_4_4.part)

    # Combine9: union body 4 4, body 3 8
    add(body_4_4_1.part)
    add(body_3_8.part)

    # Sketch55 → Boss-Extrude33 (add)
    with BuildSketch(Plane(origin=(0, -11.32398317, 0), x_dir=(1, 0, 0), z_dir=(0, 1, 0))):
        with Locations((10.221556697, -1.004386861)):
            Rectangle(SKETCH55_W, SKETCH55_H)
    extrude(amount=BOSS_EXTRUDE33_DEPTH)

    # Sketch56 → Cut-Extrude25 (cut)
    with BuildSketch(Plane.ZY.offset(-7.421556697)):
        with Locations((0.004386861, -5.661991585)):
            Rectangle(SKETCH56_W, SKETCH56_H)
    extrude(amount=-CUT_EXTRUDE25_DEPTH, mode=Mode.SUBTRACT)


with BuildPart() as cut_extrude28_tool:
    # Sketch62 → Cut-Extrude28 (new body)
    with BuildSketch(Plane(origin=(0, 3, 0), x_dir=(1, 0, 0), z_dir=(0, 1, 0))):
        with Locations((-5.767223107, 30.754931698)):
            Rectangle(SKETCH62_W, SKETCH62_H)
    extrude(amount=-CUT_EXTRUDE28_DEPTH)


with BuildPart() as body_4_6:
    add(body_4_5.part)

    # Cut-Extrude28: cut by cut_extrude28_tool
    add(cut_extrude28_tool.part, mode=Mode.SUBTRACT)

    # Sketch64 → Boss-Extrude35 (add)
    with BuildSketch(Plane(origin=(0, 3, 0), x_dir=(1, 0, 0), z_dir=(0, 1, 0))):
        with Locations((-5.767223107, 5.214512395)):
            Rectangle(SKETCH64_W, SKETCH64_H)
        with Locations((-5.767223107, 56.295351)):
            Rectangle(SKETCH64_W, SKETCH64_H)
    extrude(amount=-BOSS_EXTRUDE35_DEPTH)


with BuildPart() as body_3_6_1:
    add(body_3_6.part)

    # Cut-Extrude28: cut by cut_extrude28_tool
    add(cut_extrude28_tool.part, mode=Mode.SUBTRACT)

    # Sketch65 → Boss-Extrude37 (add)
    with BuildSketch(Plane.XZ):
        with Locations((-5.767223107, -5.214512395)):
            Rectangle(SKETCH65_W, SKETCH65_H)
        with Locations((-5.767223107, -56.295351)):
            Rectangle(SKETCH65_W, SKETCH65_H)
    extrude(amount=-BOSS_EXTRUDE37_DEPTH)


with BuildPart() as cut_extrude31_tool:
    # Sketch67 → Cut-Extrude31 (new body)
    with BuildSketch(Plane.XZ):
        with Locations((-5.767223107, -32.354931697)):
            Rectangle(SKETCH67_W, SKETCH67_H)
    extrude(amount=-CUT_EXTRUDE31_DEPTH)


with BuildPart() as body_4_7:
    add(body_4_6.part)

    # Cut-Extrude31: cut by cut_extrude31_tool
    add(cut_extrude31_tool.part, mode=Mode.SUBTRACT)

    # Sketch71 → Cut-Extrude32 (cut)
    with BuildSketch(Plane(origin=(0, 0, -5.254512395), x_dir=(-1, 0, 0), z_dir=(0, 0, -1))):
        with Locations((5.767223107, 2.5)):
            Rectangle(SKETCH71_W, SKETCH71_H)
    extrude(amount=-CUT_EXTRUDE32_DEPTH, mode=Mode.SUBTRACT)

    # Sketch72 → Boss-Extrude41 (add)
    with BuildSketch(Plane.XY.offset(-56.255351)):
        with Locations((-5.767223107, 2.5)):
            Rectangle(SKETCH72_W, SKETCH72_H)
    extrude(amount=BOSS_EXTRUDE41_DEPTH)

    # Sketch74 → Boss-Extrude43 (add)
    with BuildSketch(Plane(origin=(0, 0, -60.542924633), x_dir=(-1, 0, 0), z_dir=(0, 0, -1))):
        with Locations((5.767223107, 2.5)):
            Rectangle(SKETCH74_W, SKETCH74_H)
    extrude(amount=BOSS_EXTRUDE43_DEPTH)

    # Sketch75 → Boss-Extrude44 (add)
    with BuildSketch(Plane(origin=(0, 3, 0), x_dir=(1, 0, 0), z_dir=(0, 1, 0))):
        with Locations(Location((-5.767223107, -29.250452542, 0), (0, 0, 90))):
            Circle(SKETCH75_R)
    extrude(amount=-BOSS_EXTRUDE44_DEPTH)


with BuildPart() as body_3_6_2:
    add(body_3_6_1.part)

    # Cut-Extrude31: cut by cut_extrude31_tool
    add(cut_extrude31_tool.part, mode=Mode.SUBTRACT)

    # Sketch69 → Boss-Extrude39 (add)
    with BuildSketch(Plane(origin=(0, 0, -1.654512395), x_dir=(-1, 0, 0), z_dir=(0, 0, -1))):
        with Locations((6.105401472, 0.5)):
            Rectangle(SKETCH69_W, SKETCH69_H)
    extrude(amount=-BOSS_EXTRUDE39_DEPTH)

    # Sketch70 → Boss-Extrude40 (add)
    with BuildSketch(Plane.XY.offset(-63.055351)):
        with Locations((-5.767223107, 1)):
            Rectangle(SKETCH70_W, SKETCH70_H)
    extrude(amount=BOSS_EXTRUDE40_DEPTH)

    # Sketch73 → Cut-Extrude33 (cut)
    with BuildSketch(Plane.XY.offset(-62.055351)):
        with Locations((-5.767223107, 1)):
            Rectangle(SKETCH73_W, SKETCH73_H)
    extrude(amount=-CUT_EXTRUDE33_DEPTH, mode=Mode.SUBTRACT)


solid = Compound([body_4_7.part, body_3_6_2.part])
